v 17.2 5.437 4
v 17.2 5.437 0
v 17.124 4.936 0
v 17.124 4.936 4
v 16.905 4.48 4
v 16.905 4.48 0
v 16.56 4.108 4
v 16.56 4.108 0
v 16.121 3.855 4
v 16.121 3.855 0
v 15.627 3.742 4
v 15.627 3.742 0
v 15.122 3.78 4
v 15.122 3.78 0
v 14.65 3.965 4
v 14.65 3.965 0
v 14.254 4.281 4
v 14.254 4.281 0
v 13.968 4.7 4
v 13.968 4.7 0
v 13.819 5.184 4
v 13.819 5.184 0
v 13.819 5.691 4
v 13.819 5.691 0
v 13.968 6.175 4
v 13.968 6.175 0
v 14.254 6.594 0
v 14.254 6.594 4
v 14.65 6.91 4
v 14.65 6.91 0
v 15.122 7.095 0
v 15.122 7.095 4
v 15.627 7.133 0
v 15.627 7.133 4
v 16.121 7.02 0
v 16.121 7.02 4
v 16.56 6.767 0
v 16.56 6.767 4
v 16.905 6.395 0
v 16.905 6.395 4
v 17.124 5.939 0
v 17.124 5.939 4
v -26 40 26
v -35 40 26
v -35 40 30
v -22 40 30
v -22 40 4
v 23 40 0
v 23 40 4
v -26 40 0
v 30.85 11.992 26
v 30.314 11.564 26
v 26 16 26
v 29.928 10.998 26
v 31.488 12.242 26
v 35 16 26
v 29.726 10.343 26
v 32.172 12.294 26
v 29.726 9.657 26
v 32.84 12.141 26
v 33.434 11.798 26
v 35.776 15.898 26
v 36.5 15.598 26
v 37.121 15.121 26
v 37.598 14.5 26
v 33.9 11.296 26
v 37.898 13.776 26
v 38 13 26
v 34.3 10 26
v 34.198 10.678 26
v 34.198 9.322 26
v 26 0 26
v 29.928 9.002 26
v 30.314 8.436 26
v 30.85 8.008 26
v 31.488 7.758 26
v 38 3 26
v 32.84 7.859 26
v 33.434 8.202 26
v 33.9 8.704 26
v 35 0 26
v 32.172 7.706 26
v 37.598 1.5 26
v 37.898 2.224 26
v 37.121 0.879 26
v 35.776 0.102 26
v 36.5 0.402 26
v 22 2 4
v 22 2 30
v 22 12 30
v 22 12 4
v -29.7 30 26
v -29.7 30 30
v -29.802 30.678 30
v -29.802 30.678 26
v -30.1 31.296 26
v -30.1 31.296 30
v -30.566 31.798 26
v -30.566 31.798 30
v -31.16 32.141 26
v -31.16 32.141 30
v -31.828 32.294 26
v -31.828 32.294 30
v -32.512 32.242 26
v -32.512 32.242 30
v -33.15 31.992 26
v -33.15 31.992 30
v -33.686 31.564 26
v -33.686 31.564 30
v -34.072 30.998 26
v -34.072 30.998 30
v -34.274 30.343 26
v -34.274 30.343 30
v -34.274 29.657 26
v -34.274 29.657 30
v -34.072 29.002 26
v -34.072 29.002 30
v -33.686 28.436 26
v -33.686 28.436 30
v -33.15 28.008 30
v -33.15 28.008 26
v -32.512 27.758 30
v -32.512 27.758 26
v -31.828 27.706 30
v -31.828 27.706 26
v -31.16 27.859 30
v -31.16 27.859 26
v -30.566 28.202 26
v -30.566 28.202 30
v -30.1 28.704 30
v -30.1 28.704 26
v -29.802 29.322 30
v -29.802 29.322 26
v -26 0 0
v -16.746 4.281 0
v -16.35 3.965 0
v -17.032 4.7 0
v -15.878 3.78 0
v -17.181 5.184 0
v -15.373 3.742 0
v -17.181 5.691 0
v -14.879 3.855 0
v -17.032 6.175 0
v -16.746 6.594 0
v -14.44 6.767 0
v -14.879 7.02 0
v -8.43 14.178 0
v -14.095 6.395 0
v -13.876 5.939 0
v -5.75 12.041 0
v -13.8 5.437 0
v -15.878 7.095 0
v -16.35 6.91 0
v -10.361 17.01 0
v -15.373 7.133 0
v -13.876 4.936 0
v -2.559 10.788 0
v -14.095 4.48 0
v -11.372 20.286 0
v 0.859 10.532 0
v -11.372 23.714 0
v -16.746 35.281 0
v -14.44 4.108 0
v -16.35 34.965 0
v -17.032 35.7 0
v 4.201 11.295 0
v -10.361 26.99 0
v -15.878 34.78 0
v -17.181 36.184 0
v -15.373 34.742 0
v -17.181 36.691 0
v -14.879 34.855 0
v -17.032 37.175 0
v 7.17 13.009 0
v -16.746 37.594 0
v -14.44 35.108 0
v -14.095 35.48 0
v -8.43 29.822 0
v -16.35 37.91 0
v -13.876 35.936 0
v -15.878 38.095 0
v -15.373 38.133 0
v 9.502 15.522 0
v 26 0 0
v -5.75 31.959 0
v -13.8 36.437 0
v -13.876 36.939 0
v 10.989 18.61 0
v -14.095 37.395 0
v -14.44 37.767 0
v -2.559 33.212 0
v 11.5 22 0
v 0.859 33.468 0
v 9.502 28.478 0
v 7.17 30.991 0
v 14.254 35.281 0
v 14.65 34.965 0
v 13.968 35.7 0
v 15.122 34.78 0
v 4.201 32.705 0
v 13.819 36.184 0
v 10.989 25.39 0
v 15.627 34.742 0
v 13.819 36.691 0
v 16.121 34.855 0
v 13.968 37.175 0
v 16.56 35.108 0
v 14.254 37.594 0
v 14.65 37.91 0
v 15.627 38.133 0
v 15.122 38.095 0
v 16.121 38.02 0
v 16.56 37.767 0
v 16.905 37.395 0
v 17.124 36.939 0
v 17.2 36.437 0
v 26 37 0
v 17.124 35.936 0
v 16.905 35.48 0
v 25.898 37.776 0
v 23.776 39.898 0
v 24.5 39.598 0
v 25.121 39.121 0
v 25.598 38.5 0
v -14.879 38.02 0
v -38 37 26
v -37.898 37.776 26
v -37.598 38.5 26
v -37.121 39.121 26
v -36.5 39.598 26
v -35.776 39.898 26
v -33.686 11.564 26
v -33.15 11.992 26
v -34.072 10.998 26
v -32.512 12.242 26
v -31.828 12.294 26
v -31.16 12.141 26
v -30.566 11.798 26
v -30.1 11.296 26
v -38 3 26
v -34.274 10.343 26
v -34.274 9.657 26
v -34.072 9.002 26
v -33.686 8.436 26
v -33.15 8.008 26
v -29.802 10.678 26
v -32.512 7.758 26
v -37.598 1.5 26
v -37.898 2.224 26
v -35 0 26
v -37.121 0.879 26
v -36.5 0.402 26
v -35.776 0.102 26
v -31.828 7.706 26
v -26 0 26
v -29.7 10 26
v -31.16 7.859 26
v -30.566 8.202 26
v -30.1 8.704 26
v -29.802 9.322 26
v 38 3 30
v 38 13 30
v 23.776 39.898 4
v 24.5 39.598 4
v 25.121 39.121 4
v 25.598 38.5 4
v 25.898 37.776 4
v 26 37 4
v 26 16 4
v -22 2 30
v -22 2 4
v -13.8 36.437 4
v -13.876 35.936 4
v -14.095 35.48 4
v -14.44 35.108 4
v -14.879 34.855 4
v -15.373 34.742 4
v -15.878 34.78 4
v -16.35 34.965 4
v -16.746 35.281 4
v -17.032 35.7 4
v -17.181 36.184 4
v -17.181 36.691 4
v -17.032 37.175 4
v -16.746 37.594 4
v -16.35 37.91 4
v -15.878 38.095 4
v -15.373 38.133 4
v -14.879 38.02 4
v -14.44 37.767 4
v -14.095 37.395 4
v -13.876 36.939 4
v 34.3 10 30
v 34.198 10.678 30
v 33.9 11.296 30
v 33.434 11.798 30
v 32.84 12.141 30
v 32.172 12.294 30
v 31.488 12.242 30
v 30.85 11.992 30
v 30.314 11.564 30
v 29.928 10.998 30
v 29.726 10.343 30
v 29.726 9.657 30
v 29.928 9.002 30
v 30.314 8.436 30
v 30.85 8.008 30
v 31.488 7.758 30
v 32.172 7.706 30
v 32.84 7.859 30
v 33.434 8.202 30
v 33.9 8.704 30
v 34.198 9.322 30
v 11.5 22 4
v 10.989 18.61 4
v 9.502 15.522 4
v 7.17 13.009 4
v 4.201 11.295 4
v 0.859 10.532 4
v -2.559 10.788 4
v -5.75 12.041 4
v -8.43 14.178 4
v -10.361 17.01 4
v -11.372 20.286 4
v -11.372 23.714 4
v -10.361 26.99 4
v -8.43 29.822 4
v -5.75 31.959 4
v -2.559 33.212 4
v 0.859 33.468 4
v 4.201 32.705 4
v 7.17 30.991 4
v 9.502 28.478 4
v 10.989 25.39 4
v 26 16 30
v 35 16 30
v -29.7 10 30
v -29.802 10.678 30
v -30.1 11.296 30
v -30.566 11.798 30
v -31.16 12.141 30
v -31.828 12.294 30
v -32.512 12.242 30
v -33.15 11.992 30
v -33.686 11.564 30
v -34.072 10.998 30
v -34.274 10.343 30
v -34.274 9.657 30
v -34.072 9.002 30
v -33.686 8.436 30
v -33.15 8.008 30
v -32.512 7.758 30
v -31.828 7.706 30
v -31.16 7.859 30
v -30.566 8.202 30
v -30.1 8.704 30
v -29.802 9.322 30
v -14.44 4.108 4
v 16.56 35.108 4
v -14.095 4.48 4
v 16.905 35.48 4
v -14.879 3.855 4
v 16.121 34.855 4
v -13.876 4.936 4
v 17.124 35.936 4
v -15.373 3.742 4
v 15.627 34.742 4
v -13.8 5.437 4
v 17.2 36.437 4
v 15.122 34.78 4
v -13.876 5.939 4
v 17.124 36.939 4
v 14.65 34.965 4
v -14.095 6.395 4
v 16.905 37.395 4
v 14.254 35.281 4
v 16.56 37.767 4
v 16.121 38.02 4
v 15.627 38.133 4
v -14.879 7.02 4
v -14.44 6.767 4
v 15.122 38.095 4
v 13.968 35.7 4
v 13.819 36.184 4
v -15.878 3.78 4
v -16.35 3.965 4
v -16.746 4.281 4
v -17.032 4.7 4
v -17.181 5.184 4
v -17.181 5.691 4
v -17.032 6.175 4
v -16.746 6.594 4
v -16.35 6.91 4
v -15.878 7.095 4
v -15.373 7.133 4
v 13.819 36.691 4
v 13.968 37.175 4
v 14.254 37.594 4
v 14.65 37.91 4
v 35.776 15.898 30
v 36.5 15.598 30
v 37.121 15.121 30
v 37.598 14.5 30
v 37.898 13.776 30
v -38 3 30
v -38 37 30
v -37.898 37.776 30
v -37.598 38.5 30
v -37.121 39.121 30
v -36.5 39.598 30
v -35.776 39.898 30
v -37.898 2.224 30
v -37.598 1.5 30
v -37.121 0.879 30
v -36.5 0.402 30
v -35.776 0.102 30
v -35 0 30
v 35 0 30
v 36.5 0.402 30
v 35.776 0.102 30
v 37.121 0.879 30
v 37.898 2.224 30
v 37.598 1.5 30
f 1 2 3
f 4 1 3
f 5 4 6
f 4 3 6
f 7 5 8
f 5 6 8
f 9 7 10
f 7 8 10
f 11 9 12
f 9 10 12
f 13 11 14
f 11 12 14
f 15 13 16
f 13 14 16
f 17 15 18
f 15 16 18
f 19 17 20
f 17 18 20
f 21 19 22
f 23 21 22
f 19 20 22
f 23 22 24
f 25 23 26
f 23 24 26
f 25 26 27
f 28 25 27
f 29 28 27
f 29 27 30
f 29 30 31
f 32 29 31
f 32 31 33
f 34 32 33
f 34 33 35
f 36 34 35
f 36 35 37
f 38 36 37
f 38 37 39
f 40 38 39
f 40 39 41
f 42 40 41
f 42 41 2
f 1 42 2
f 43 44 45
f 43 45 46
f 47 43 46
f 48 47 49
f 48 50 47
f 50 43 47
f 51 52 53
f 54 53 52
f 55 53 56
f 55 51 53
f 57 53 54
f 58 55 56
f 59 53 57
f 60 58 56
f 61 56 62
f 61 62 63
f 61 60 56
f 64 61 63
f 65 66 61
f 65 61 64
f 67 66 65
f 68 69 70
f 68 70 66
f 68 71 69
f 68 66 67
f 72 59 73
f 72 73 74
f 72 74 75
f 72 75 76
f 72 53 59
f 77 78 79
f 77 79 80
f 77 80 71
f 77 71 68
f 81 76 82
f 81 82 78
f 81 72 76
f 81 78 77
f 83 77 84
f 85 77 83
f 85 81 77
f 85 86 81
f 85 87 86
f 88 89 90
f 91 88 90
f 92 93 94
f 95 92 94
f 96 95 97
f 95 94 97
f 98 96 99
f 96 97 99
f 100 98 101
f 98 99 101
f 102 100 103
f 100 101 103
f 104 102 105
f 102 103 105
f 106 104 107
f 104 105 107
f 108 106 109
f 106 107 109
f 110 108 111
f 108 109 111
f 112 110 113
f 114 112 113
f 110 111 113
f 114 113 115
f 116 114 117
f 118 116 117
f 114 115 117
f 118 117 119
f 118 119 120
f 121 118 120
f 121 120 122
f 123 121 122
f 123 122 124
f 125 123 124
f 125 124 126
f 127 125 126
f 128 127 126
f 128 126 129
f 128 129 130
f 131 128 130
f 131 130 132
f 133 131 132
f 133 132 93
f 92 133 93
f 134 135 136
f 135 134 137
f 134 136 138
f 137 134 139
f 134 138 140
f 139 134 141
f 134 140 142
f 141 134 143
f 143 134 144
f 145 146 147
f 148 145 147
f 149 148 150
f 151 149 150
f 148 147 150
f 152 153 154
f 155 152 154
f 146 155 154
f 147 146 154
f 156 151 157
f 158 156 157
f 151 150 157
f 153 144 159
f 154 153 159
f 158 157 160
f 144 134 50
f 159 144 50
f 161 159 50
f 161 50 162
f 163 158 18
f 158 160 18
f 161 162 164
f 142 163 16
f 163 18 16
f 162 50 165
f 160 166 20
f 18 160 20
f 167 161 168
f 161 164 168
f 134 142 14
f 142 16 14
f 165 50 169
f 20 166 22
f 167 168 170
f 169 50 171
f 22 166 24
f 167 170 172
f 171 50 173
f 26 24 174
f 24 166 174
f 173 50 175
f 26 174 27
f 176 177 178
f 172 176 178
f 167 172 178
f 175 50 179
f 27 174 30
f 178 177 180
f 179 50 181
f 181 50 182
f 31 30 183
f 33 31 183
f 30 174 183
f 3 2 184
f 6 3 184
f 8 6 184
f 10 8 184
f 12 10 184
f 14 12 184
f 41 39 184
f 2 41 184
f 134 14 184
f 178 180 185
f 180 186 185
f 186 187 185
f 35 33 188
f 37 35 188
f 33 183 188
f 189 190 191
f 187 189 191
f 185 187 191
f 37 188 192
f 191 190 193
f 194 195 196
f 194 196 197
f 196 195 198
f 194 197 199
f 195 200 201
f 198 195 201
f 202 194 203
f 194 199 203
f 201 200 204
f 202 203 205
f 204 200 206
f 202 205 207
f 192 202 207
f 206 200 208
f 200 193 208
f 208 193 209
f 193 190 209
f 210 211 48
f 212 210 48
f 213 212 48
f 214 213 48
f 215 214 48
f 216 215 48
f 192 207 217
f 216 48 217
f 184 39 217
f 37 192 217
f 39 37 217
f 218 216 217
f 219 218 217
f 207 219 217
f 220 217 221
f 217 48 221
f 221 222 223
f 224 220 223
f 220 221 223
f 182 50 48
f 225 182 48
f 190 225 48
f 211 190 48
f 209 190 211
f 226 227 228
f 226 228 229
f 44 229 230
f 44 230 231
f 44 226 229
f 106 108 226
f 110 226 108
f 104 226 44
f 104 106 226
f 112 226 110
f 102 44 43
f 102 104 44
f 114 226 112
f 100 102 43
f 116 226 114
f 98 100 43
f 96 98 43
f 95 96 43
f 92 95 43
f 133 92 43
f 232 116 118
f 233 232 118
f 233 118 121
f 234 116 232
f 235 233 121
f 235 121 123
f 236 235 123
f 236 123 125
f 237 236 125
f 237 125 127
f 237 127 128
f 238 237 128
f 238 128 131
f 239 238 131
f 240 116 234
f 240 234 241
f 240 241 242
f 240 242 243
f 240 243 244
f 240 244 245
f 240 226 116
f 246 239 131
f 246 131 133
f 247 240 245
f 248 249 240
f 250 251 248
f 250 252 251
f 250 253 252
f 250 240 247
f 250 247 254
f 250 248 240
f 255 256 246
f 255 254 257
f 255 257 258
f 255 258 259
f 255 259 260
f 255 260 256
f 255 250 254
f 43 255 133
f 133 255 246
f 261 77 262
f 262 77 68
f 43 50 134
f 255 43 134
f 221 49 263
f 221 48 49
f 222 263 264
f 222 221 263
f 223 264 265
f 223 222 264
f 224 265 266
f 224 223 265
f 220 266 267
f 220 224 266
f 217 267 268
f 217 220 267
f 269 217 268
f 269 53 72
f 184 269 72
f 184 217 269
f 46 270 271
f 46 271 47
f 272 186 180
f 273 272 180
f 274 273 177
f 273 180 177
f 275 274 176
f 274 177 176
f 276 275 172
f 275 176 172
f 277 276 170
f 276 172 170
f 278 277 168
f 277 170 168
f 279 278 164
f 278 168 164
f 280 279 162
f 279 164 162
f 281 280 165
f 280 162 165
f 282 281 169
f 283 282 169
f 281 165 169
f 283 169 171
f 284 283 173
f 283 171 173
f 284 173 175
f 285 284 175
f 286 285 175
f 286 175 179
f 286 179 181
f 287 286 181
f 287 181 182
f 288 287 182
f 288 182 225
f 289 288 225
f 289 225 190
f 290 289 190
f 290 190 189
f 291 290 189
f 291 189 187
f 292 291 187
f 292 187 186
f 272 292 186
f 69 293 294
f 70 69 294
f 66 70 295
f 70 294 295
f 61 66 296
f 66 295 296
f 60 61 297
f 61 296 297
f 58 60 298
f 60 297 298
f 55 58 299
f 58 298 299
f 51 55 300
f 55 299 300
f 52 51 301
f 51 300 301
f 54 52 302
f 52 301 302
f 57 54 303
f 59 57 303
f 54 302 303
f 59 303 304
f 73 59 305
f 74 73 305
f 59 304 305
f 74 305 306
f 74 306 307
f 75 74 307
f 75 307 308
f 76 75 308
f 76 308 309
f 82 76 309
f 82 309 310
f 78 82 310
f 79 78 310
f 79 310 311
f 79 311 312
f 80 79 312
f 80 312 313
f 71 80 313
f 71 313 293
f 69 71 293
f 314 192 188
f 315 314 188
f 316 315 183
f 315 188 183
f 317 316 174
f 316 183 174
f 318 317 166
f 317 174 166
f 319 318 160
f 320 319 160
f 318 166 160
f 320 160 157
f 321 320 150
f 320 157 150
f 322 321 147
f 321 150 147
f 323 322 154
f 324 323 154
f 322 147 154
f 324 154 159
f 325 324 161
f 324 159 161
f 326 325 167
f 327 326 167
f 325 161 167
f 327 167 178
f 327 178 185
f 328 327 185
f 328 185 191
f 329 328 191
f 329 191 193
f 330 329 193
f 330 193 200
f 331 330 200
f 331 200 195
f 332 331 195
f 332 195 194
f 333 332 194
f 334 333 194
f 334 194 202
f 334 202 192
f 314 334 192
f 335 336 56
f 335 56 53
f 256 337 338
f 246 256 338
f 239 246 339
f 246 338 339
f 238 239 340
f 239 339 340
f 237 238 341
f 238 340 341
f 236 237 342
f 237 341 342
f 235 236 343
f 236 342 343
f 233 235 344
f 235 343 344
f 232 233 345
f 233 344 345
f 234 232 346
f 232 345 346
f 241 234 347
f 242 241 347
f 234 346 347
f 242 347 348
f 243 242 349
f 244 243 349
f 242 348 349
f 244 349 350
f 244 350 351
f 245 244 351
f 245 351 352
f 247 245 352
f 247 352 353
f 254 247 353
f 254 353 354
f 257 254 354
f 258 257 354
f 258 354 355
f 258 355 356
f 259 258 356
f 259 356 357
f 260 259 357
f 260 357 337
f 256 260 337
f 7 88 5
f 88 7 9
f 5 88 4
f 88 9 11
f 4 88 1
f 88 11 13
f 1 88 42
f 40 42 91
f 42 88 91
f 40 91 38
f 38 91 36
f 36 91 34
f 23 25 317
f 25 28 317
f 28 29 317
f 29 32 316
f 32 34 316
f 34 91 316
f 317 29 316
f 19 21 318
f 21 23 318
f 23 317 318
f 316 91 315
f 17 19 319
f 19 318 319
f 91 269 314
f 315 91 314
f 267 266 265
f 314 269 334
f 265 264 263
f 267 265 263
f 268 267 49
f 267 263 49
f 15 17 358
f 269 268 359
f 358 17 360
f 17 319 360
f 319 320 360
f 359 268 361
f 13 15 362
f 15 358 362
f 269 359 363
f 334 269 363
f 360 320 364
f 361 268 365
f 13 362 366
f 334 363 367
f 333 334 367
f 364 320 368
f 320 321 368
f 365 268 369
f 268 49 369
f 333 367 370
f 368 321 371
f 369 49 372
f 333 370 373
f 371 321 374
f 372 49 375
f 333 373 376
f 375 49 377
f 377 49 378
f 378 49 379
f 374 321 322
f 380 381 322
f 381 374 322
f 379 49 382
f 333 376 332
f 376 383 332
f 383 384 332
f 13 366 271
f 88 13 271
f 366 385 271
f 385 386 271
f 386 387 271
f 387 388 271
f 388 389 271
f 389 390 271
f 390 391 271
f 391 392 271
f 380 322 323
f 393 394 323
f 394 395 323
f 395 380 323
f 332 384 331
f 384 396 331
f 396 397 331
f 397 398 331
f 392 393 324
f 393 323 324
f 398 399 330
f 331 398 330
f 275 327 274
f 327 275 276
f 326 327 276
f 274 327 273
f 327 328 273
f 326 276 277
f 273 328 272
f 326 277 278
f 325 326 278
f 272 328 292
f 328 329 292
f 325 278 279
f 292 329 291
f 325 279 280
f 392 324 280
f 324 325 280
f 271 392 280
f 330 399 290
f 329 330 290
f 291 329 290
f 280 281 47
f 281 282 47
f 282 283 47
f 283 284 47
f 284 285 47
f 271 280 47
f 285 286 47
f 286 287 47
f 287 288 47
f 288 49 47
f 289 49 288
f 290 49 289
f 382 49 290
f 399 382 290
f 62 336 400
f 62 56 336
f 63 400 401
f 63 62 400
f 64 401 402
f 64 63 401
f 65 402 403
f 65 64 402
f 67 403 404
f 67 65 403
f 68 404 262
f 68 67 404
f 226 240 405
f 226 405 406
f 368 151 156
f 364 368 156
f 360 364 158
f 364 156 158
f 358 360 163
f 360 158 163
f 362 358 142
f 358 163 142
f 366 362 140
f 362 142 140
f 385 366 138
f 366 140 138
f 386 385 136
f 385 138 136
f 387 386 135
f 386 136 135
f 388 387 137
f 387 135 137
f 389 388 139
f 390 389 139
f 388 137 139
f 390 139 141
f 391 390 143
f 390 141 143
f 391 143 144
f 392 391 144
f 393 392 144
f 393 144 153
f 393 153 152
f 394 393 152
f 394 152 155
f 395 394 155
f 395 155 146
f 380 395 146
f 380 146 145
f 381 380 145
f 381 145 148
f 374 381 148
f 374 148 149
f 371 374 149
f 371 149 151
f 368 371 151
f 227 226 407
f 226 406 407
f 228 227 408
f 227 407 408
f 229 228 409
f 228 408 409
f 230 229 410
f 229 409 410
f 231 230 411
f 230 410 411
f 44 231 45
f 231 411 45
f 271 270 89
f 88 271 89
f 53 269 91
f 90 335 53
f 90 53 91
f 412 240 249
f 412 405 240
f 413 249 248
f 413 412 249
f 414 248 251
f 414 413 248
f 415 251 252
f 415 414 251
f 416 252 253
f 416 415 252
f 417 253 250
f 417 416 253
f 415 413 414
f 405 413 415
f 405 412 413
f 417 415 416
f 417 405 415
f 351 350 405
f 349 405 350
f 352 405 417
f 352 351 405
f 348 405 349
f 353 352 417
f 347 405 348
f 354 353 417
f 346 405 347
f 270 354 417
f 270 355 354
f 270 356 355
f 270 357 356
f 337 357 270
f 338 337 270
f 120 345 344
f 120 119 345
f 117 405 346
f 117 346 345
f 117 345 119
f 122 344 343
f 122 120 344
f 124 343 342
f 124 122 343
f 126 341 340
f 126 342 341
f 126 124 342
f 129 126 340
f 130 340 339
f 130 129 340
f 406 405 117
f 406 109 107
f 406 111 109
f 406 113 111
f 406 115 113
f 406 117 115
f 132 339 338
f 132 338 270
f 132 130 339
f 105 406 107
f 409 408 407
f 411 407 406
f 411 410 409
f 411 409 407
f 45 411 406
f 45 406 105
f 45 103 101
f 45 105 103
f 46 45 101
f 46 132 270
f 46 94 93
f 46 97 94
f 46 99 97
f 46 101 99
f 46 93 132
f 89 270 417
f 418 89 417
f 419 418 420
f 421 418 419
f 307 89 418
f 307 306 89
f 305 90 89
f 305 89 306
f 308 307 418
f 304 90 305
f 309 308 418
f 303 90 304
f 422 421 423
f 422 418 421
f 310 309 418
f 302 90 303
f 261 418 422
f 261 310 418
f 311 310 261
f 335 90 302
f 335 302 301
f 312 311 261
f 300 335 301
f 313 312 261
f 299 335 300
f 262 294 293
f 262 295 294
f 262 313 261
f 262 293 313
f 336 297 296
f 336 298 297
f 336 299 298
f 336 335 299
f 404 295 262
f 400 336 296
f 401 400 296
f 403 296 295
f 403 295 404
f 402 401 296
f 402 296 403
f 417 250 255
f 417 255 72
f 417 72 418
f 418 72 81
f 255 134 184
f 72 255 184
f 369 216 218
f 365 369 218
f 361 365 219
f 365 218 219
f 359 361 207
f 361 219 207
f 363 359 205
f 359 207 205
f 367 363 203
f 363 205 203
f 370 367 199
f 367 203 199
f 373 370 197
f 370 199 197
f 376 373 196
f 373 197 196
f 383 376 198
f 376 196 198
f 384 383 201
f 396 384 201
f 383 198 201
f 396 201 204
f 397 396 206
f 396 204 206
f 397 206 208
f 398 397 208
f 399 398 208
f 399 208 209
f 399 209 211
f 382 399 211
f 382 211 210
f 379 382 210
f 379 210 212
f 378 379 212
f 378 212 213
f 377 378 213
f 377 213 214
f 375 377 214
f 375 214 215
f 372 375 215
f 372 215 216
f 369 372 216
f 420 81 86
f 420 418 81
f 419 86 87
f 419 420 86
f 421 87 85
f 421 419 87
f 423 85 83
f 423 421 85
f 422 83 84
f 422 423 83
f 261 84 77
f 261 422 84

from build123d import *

# Parameters (mm, degrees)
SKETCH_W        = 76
SKETCH_H        = 40
PAD_DEPTH       = 30
SKETCH001_W     = 44
SKETCH001_H     = 43.078728
POCKET_DEPTH    = 26
SKETCH002_R     = 2.3
POCKET001_DEPTH = 30.001
SKETCH003_W     = 14
SKETCH003_H     = 44.554736
SKETCH003_H_2   = 44
POCKET002_DEPTH = 26
POCKET003_DEPTH = 26
SKETCH005_R     = 11.5
SKETCH005_R_2   = 1.7
POCKET004_DEPTH = 5
FILLET_R        = 3


with BuildPart() as part:
    # Sketch → Pad (new body)
    with BuildSketch(Plane.XY):
        with Locations((0, 20)):
            Rectangle(SKETCH_W, SKETCH_H)
    extrude(amount=PAD_DEPTH)

    # Sketch001 → Pocket (cut)
    with BuildSketch(Plane.XY.offset(30)):
        with Locations((0, 23.539364)):
            Rectangle(SKETCH001_W, SKETCH001_H)
    extrude(amount=-POCKET_DEPTH, mode=Mode.SUBTRACT)

    # Sketch002 → Pocket001 (cut, through all)
    with BuildSketch(Plane.XY.offset(30)):
        with Locations((-32, 10)):
            Circle(SKETCH002_R)
        with Locations((-32, 30)):
            Circle(SKETCH002_R)
        with Locations((32, 10)):
            Circle(SKETCH002_R)
    extrude(amount=-POCKET001_DEPTH, mode=Mode.SUBTRACT)

    # Sketch003 → Pocket002 (cut)
    with BuildSketch(Plane(origin=(0, 0, 0), x_dir=(1, 0, 0), z_dir=(0, 0, -1))):
        with Locations((-33, -19.722632)):
            Rectangle(SKETCH003_W, SKETCH003_H)
        with Locations((33, -20)):
            Rectangle(SKETCH003_W, SKETCH003_H_2)
    extrude(amount=-POCKET002_DEPTH, mode=Mode.SUBTRACT)

    # Sketch004 → Pocket003 (cut)
    with BuildSketch(Plane.XY.offset(30)):
        Polygon((20, 42), (40, 42), (40, 16), (26, 16), (20, 10), align=None)
    extrude(amount=-POCKET003_DEPTH, mode=Mode.SUBTRACT)

    # Sketch005 → Pocket004 (cut)
    with BuildSketch(Plane(origin=(0, 0, 0), x_dir=(1, 0, 0), z_dir=(0, 0, -1))):
        with Locations((0, -22)):
            Circle(SKETCH005_R)
        with Locations((-15.5, -5.437484)):
            Circle(SKETCH005_R_2)
        with Locations((15.5, -5.437484)):
            Circle(SKETCH005_R_2)
        with Locations((15.5, -36.437484)):
            Circle(SKETCH005_R_2)
        with Locations((-15.5, -36.437484)):
            Circle(SKETCH005_R_2)
    extrude(amount=-POCKET004_DEPTH, mode=Mode.SUBTRACT)

    # Fillet
    fillet_edges = [part.edges().sort_by_distance(p)[0] for p in [
        (26, 40, 2),
        (38, 16, 28),
        (38, 0, 28),
        (-38, 40, 28),
        (-38, 0, 28),
    ]]
    fillet(fillet_edges, radius=FILLET_R)


solid = part.part
